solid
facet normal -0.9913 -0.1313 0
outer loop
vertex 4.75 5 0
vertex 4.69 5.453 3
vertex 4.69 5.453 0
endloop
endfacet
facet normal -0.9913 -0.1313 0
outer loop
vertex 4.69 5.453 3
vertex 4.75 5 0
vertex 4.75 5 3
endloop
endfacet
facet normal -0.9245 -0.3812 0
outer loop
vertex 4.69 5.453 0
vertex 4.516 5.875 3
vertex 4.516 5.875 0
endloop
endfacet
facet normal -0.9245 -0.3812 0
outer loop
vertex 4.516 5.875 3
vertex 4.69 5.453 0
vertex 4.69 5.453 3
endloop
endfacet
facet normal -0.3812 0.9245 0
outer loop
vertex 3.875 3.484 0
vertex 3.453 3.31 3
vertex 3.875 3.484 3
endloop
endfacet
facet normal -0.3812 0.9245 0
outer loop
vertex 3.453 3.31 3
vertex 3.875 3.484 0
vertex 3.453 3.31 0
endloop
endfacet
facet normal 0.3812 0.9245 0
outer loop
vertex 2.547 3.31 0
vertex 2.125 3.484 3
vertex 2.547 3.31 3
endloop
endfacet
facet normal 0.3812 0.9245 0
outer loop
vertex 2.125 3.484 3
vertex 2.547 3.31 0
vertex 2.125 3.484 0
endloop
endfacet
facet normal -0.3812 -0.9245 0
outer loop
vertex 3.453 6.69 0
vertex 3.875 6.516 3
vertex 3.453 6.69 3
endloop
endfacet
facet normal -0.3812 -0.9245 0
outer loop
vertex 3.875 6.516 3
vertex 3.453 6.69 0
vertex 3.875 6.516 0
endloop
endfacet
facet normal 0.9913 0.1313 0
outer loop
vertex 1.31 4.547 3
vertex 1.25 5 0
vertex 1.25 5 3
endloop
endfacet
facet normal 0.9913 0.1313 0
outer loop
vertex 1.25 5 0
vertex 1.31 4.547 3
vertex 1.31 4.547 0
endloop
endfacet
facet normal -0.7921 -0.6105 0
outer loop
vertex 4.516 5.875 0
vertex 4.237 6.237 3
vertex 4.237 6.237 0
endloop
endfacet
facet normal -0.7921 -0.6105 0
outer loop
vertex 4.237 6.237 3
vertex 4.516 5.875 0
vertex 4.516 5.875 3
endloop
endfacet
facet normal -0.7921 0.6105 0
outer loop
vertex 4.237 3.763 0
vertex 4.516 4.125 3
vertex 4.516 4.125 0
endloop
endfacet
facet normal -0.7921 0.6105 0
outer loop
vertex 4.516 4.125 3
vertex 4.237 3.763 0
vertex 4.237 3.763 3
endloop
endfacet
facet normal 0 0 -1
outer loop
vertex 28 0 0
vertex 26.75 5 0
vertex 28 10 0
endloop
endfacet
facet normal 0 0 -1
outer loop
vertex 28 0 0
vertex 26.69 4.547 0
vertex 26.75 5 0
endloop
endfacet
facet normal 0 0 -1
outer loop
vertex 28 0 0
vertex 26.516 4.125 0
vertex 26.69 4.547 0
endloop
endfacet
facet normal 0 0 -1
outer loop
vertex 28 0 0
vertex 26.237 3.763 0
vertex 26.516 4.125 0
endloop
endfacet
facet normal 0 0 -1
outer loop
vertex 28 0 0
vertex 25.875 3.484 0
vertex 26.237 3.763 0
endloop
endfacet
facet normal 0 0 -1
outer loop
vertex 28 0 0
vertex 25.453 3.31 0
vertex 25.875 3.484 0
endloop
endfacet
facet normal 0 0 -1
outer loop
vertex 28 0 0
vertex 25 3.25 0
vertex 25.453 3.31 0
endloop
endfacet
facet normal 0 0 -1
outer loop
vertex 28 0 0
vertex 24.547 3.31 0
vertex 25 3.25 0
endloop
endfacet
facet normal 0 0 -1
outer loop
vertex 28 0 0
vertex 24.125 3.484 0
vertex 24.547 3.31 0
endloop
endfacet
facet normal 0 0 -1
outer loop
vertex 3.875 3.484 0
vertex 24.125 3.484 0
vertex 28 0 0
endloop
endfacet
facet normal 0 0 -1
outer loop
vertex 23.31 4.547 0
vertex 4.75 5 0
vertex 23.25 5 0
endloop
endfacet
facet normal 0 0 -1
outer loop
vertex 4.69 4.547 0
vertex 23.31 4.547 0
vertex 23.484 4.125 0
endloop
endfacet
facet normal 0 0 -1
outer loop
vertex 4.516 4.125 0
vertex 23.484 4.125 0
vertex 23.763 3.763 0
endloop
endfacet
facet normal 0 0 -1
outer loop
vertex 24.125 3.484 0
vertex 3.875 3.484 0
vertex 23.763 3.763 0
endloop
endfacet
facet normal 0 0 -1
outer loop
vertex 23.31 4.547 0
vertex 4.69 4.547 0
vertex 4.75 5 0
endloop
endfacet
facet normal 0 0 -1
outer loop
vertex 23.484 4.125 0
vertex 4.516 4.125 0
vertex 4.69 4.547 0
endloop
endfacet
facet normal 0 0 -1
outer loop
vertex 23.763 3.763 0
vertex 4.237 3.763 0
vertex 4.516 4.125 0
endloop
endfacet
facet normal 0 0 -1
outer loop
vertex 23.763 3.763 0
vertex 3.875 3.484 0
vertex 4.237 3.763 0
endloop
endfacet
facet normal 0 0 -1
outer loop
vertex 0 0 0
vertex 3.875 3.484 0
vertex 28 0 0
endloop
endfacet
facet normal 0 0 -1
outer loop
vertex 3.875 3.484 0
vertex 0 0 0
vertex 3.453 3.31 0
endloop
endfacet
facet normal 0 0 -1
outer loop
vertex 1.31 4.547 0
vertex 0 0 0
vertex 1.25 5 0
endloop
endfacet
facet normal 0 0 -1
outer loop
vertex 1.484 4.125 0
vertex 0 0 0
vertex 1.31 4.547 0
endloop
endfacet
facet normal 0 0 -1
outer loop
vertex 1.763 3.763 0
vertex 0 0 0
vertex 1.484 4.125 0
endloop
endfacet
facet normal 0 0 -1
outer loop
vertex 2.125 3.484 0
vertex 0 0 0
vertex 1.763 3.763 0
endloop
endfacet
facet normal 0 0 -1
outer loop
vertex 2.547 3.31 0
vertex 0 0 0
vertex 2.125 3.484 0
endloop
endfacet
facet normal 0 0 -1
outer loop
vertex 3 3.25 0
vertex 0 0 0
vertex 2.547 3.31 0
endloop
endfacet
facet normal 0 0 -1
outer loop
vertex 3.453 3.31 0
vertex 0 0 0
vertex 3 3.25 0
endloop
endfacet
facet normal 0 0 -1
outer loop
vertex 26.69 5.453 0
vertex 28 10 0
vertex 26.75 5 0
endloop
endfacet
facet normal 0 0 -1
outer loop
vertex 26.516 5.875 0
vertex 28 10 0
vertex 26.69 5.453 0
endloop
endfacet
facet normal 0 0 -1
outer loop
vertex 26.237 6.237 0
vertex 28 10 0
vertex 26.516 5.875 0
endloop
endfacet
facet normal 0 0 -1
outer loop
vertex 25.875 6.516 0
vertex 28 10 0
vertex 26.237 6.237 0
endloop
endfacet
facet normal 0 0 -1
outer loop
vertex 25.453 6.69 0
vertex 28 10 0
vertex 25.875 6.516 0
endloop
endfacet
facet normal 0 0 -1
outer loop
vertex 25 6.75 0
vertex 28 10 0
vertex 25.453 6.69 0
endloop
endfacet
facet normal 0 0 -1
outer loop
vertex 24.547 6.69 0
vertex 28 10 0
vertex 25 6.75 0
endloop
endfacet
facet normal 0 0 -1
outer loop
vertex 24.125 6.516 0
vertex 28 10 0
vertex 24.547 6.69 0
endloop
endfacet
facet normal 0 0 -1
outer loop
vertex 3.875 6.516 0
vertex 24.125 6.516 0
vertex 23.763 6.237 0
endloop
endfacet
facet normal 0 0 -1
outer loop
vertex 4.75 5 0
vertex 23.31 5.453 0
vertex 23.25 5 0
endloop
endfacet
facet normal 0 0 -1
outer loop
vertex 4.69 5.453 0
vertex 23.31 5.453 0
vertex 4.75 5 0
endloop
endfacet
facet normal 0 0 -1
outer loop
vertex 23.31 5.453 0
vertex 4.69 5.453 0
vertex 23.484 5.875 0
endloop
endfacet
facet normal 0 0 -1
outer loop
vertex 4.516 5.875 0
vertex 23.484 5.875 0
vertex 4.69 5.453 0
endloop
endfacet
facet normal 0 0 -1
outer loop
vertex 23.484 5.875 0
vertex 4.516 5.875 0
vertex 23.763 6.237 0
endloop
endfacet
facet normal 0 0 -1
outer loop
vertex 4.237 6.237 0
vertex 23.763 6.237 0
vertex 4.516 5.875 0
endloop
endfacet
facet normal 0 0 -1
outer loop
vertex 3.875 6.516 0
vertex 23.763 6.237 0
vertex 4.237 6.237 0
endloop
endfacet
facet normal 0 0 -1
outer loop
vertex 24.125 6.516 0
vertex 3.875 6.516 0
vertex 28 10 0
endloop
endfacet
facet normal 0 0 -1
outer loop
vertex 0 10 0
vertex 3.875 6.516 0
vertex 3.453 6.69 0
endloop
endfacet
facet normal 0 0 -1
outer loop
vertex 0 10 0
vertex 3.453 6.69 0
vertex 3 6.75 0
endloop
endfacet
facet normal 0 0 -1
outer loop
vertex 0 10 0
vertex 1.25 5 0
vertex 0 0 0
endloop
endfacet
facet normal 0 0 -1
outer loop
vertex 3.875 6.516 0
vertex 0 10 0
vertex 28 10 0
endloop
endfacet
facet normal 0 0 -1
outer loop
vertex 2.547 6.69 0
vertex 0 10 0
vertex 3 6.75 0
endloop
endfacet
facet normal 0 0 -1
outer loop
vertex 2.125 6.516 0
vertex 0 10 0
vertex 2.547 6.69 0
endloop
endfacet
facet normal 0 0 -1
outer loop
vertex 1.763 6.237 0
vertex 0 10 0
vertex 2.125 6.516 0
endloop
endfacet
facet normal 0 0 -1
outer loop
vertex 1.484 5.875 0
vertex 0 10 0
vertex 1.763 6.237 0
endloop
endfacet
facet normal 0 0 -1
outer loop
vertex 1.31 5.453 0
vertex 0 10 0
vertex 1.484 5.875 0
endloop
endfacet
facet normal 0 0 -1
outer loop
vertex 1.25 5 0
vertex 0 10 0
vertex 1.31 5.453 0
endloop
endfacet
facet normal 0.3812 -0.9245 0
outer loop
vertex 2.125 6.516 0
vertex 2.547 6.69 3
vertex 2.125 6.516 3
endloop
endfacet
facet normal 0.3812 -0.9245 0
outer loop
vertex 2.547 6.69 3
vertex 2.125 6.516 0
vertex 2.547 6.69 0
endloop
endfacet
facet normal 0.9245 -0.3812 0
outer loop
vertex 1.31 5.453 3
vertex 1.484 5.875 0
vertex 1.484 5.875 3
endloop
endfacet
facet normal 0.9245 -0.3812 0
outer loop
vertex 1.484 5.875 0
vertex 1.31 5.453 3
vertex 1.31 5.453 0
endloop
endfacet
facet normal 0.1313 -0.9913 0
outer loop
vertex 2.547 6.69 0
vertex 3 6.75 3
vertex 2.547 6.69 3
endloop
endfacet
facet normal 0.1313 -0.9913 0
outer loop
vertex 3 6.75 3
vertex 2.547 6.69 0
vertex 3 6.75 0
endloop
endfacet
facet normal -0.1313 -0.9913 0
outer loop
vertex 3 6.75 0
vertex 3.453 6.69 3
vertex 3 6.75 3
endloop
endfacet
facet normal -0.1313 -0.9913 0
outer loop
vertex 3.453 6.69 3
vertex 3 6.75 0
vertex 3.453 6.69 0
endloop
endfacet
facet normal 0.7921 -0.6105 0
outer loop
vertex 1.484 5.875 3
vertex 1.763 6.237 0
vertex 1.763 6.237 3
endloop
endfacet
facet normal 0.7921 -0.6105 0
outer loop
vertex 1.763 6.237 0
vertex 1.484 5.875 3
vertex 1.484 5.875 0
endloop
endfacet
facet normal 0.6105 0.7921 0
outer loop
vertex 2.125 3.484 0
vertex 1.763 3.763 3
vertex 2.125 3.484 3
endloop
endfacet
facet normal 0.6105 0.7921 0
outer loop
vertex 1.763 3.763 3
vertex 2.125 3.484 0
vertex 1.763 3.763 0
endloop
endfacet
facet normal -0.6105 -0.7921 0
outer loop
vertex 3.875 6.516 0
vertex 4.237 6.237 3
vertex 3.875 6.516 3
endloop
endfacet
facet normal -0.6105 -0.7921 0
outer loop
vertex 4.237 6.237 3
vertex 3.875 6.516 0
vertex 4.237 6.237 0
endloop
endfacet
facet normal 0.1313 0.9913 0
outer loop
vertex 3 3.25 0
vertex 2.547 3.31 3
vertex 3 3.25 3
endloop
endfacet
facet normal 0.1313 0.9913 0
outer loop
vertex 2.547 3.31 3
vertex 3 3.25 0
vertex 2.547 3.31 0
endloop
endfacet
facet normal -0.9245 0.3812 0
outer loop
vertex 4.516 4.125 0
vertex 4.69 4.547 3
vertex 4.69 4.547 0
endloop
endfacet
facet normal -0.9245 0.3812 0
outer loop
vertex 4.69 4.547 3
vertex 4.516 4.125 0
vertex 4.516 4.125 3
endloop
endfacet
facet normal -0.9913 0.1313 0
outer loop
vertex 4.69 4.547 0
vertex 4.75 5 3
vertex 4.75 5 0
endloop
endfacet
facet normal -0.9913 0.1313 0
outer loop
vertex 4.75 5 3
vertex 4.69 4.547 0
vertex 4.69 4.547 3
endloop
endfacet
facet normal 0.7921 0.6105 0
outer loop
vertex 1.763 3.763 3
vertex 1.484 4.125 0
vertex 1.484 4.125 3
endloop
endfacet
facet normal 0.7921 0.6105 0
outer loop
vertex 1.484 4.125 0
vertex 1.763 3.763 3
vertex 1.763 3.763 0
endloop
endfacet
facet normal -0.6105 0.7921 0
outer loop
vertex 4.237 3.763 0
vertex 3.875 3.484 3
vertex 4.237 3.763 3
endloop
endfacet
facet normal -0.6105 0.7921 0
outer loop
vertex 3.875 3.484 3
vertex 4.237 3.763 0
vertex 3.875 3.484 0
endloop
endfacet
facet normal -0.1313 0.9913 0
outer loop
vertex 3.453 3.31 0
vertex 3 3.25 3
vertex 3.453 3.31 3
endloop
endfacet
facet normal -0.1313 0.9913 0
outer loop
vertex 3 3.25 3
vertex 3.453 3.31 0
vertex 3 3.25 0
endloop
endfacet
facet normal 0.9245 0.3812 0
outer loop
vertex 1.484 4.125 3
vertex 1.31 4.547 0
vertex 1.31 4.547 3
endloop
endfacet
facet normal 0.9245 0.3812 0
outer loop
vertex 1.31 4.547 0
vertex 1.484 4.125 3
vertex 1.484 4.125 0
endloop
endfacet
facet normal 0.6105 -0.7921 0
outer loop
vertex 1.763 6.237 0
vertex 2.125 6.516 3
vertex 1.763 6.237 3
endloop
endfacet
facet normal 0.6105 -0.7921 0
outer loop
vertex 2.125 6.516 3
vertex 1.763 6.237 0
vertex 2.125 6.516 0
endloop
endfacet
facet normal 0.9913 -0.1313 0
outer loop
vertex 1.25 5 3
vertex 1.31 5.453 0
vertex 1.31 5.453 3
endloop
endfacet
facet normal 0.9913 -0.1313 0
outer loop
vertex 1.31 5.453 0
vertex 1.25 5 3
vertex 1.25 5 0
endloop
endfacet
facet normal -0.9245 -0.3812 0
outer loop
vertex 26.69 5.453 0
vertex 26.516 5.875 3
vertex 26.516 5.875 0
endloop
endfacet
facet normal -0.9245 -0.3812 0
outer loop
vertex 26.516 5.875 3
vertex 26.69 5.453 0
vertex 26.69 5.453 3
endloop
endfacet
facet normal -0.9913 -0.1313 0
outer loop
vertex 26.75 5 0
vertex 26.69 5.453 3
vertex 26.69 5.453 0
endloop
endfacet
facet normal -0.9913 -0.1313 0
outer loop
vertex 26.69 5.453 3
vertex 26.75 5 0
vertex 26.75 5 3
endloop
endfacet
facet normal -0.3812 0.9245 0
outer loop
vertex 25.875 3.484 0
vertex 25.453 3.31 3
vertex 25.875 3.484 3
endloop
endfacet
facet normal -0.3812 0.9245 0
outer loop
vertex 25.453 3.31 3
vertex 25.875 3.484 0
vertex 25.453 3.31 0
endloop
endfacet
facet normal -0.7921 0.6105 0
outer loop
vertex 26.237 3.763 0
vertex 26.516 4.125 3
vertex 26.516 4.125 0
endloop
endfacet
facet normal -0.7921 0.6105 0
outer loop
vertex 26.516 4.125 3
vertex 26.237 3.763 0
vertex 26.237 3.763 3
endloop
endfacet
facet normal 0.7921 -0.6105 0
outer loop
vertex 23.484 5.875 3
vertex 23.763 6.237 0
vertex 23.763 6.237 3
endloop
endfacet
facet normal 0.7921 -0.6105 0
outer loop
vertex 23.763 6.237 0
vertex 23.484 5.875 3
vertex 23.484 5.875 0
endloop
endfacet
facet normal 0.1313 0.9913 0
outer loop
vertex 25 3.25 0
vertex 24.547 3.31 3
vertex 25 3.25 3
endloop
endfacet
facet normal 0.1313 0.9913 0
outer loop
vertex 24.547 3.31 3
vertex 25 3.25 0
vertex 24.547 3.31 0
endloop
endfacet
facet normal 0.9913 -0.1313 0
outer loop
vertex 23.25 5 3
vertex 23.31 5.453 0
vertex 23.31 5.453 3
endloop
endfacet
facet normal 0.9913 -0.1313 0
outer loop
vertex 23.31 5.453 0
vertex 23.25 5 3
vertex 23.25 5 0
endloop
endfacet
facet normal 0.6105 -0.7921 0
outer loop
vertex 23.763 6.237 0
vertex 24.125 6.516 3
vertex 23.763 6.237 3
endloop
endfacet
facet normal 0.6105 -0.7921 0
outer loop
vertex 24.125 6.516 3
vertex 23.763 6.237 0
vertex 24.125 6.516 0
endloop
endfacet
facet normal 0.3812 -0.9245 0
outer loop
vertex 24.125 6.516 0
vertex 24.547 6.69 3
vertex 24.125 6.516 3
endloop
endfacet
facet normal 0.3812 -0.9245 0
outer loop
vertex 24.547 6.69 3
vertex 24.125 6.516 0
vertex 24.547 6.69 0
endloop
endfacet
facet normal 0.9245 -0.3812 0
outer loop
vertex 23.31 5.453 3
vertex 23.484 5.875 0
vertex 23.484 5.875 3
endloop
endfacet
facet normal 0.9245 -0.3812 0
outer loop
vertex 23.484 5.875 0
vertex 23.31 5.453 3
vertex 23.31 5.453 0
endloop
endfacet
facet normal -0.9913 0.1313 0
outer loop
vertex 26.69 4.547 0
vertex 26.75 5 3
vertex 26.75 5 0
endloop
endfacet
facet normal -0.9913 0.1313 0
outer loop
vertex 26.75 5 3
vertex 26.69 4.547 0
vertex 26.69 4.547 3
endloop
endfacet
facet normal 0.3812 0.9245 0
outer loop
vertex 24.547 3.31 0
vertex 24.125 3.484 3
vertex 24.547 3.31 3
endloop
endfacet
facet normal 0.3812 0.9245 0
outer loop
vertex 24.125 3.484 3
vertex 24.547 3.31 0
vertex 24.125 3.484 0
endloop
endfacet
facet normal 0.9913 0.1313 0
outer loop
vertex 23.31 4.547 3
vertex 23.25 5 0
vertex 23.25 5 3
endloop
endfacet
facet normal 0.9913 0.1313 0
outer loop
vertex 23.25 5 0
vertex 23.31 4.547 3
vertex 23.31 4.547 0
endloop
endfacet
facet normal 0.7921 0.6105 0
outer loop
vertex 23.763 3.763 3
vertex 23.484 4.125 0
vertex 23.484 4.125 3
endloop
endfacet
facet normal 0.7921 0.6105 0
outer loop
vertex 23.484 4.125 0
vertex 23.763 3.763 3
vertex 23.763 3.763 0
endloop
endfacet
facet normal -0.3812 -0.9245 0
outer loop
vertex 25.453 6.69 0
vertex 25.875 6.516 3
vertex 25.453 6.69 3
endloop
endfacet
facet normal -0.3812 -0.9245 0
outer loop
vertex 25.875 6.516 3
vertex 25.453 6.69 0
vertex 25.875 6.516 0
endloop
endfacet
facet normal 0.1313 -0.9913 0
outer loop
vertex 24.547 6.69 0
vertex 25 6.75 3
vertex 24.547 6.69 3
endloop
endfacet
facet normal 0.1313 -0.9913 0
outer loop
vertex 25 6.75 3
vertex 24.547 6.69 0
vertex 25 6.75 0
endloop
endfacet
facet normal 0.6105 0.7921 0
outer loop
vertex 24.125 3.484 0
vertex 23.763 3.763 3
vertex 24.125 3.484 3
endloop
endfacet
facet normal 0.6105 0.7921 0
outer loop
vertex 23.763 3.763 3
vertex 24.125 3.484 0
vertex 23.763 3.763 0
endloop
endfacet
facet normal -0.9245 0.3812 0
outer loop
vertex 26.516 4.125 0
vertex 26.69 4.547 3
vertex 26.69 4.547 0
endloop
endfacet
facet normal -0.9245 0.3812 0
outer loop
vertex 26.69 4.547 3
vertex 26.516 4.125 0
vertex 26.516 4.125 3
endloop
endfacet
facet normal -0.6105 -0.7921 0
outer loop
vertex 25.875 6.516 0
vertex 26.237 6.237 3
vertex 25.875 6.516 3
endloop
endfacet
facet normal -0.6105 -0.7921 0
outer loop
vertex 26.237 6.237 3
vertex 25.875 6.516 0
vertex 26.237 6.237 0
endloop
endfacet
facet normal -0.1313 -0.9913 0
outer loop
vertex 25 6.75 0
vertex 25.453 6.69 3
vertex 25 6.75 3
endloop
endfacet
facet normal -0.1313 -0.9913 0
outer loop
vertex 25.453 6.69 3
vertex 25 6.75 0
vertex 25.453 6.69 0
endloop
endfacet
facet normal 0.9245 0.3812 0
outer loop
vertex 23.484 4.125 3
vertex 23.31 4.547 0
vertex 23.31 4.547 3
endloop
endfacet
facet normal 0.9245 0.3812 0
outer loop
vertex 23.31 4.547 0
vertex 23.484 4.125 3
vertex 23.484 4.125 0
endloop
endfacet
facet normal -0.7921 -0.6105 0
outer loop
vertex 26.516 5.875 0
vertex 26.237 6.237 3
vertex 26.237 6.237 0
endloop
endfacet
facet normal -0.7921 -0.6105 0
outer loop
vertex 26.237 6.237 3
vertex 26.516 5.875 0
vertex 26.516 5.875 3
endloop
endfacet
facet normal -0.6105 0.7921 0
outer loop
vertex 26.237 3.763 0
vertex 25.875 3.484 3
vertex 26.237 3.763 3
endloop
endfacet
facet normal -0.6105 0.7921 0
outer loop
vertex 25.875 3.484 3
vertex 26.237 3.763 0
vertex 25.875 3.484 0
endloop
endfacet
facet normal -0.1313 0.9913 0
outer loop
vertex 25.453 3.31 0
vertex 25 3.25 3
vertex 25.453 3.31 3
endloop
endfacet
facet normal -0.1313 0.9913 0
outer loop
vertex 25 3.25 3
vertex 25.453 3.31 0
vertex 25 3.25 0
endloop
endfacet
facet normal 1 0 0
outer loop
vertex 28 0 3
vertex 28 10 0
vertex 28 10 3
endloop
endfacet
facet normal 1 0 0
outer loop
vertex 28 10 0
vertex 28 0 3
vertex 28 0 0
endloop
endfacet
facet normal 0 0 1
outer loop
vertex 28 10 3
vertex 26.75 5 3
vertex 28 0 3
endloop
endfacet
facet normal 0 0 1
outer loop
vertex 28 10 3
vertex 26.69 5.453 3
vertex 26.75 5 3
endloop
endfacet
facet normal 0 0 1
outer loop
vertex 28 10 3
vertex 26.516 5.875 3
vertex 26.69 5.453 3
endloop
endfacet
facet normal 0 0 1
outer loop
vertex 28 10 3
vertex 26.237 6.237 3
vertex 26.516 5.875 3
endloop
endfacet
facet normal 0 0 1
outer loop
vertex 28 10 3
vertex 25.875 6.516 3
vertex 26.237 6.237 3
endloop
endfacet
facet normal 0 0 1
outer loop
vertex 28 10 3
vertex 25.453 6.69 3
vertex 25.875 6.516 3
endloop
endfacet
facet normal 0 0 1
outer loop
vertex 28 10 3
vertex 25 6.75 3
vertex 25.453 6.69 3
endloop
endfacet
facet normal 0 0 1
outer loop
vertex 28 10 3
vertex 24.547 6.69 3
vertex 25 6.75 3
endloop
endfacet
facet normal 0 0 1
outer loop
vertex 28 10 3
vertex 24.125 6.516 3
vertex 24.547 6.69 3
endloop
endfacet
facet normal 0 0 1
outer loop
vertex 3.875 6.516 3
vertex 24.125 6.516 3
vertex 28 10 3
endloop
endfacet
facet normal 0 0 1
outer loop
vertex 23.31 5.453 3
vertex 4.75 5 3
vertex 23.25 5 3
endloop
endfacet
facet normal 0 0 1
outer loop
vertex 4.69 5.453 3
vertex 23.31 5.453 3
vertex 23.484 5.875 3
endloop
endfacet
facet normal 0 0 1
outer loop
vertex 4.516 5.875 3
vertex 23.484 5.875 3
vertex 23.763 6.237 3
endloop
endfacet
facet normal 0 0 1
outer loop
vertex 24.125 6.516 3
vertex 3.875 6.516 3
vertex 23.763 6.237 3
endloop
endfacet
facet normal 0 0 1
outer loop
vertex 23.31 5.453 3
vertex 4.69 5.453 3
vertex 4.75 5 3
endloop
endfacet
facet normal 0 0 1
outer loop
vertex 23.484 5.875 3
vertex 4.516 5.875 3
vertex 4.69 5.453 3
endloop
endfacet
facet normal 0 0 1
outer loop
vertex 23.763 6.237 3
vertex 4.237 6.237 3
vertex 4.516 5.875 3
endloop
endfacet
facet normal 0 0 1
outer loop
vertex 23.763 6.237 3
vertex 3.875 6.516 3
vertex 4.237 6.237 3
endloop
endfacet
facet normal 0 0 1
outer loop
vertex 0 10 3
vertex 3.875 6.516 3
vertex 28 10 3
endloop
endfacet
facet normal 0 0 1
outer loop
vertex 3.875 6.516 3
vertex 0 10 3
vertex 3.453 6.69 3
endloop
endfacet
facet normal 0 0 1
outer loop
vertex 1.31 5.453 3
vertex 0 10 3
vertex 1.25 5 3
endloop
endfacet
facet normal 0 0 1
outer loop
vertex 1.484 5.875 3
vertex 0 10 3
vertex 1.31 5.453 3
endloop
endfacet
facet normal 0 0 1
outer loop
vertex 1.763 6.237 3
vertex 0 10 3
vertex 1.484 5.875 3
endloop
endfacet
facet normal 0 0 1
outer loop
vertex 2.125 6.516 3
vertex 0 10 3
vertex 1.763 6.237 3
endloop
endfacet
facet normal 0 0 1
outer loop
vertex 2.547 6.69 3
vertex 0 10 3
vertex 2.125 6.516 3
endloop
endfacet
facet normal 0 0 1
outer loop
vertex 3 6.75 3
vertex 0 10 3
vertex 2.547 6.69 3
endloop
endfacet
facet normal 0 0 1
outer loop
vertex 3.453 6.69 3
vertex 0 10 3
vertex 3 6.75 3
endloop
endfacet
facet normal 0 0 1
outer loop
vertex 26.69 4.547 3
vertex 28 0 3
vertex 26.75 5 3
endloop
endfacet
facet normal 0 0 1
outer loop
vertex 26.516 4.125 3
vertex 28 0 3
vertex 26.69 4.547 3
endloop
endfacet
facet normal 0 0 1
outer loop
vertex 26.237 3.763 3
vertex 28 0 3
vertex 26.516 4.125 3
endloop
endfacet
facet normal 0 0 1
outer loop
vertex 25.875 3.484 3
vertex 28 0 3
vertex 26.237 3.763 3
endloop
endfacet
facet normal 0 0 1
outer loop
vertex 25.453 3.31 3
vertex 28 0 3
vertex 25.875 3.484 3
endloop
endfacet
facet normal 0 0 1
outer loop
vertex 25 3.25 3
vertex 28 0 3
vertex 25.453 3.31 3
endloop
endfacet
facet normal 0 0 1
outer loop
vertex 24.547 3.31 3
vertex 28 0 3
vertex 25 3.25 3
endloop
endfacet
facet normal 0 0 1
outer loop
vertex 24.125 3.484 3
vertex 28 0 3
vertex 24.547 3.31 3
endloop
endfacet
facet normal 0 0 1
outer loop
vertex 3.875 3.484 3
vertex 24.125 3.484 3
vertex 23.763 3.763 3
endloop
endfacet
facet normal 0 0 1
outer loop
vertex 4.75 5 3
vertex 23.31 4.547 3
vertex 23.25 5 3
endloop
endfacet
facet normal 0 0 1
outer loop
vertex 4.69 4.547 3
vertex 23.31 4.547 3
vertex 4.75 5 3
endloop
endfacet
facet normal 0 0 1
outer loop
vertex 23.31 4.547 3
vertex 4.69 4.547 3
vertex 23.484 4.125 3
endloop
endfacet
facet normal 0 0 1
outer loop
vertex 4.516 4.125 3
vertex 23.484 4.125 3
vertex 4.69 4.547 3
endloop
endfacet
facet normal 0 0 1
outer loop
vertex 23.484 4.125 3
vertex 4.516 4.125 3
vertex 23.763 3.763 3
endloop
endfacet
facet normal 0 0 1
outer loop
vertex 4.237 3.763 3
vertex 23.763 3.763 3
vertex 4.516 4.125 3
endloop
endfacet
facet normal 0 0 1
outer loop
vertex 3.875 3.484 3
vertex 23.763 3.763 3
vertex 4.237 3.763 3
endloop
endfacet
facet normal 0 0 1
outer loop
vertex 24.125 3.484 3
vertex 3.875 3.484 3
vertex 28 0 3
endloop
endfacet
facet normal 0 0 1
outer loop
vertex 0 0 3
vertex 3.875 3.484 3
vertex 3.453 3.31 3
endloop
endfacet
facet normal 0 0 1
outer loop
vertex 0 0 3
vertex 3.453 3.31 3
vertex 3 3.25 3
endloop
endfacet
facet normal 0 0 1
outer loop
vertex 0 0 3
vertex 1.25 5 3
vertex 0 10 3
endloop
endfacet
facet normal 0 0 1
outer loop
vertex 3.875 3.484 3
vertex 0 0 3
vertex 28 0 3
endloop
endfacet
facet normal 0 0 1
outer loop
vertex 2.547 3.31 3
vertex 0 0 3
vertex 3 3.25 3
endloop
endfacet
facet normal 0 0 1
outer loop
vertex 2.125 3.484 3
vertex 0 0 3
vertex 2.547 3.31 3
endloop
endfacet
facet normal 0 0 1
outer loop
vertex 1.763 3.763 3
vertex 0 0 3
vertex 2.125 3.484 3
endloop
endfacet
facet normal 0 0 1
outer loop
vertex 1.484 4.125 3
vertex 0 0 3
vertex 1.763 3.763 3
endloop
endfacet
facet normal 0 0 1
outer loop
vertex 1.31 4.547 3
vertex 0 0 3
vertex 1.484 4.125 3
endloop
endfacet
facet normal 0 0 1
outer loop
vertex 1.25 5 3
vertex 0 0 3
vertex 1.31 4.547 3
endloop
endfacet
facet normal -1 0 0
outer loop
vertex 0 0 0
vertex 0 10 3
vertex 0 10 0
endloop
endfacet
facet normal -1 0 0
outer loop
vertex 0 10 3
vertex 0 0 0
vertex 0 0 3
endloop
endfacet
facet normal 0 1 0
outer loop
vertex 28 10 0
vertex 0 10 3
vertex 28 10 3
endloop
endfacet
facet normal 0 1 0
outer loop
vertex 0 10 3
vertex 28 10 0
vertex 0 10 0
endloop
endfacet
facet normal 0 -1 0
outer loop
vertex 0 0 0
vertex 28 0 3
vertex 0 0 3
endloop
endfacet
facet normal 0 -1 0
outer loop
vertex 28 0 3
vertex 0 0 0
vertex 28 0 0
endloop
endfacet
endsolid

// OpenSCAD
difference()
{
    union()
    {
        cube([28,10,3]);
    }
    union()
    {
        translate([(28-22)/2,5,0])
            cylinder(d=3.5,h=5,$fn=24);
        
        translate([28-(28-22)/2,5,0])
            cylinder(d=3.5,h=5,$fn=24);
    }
}
